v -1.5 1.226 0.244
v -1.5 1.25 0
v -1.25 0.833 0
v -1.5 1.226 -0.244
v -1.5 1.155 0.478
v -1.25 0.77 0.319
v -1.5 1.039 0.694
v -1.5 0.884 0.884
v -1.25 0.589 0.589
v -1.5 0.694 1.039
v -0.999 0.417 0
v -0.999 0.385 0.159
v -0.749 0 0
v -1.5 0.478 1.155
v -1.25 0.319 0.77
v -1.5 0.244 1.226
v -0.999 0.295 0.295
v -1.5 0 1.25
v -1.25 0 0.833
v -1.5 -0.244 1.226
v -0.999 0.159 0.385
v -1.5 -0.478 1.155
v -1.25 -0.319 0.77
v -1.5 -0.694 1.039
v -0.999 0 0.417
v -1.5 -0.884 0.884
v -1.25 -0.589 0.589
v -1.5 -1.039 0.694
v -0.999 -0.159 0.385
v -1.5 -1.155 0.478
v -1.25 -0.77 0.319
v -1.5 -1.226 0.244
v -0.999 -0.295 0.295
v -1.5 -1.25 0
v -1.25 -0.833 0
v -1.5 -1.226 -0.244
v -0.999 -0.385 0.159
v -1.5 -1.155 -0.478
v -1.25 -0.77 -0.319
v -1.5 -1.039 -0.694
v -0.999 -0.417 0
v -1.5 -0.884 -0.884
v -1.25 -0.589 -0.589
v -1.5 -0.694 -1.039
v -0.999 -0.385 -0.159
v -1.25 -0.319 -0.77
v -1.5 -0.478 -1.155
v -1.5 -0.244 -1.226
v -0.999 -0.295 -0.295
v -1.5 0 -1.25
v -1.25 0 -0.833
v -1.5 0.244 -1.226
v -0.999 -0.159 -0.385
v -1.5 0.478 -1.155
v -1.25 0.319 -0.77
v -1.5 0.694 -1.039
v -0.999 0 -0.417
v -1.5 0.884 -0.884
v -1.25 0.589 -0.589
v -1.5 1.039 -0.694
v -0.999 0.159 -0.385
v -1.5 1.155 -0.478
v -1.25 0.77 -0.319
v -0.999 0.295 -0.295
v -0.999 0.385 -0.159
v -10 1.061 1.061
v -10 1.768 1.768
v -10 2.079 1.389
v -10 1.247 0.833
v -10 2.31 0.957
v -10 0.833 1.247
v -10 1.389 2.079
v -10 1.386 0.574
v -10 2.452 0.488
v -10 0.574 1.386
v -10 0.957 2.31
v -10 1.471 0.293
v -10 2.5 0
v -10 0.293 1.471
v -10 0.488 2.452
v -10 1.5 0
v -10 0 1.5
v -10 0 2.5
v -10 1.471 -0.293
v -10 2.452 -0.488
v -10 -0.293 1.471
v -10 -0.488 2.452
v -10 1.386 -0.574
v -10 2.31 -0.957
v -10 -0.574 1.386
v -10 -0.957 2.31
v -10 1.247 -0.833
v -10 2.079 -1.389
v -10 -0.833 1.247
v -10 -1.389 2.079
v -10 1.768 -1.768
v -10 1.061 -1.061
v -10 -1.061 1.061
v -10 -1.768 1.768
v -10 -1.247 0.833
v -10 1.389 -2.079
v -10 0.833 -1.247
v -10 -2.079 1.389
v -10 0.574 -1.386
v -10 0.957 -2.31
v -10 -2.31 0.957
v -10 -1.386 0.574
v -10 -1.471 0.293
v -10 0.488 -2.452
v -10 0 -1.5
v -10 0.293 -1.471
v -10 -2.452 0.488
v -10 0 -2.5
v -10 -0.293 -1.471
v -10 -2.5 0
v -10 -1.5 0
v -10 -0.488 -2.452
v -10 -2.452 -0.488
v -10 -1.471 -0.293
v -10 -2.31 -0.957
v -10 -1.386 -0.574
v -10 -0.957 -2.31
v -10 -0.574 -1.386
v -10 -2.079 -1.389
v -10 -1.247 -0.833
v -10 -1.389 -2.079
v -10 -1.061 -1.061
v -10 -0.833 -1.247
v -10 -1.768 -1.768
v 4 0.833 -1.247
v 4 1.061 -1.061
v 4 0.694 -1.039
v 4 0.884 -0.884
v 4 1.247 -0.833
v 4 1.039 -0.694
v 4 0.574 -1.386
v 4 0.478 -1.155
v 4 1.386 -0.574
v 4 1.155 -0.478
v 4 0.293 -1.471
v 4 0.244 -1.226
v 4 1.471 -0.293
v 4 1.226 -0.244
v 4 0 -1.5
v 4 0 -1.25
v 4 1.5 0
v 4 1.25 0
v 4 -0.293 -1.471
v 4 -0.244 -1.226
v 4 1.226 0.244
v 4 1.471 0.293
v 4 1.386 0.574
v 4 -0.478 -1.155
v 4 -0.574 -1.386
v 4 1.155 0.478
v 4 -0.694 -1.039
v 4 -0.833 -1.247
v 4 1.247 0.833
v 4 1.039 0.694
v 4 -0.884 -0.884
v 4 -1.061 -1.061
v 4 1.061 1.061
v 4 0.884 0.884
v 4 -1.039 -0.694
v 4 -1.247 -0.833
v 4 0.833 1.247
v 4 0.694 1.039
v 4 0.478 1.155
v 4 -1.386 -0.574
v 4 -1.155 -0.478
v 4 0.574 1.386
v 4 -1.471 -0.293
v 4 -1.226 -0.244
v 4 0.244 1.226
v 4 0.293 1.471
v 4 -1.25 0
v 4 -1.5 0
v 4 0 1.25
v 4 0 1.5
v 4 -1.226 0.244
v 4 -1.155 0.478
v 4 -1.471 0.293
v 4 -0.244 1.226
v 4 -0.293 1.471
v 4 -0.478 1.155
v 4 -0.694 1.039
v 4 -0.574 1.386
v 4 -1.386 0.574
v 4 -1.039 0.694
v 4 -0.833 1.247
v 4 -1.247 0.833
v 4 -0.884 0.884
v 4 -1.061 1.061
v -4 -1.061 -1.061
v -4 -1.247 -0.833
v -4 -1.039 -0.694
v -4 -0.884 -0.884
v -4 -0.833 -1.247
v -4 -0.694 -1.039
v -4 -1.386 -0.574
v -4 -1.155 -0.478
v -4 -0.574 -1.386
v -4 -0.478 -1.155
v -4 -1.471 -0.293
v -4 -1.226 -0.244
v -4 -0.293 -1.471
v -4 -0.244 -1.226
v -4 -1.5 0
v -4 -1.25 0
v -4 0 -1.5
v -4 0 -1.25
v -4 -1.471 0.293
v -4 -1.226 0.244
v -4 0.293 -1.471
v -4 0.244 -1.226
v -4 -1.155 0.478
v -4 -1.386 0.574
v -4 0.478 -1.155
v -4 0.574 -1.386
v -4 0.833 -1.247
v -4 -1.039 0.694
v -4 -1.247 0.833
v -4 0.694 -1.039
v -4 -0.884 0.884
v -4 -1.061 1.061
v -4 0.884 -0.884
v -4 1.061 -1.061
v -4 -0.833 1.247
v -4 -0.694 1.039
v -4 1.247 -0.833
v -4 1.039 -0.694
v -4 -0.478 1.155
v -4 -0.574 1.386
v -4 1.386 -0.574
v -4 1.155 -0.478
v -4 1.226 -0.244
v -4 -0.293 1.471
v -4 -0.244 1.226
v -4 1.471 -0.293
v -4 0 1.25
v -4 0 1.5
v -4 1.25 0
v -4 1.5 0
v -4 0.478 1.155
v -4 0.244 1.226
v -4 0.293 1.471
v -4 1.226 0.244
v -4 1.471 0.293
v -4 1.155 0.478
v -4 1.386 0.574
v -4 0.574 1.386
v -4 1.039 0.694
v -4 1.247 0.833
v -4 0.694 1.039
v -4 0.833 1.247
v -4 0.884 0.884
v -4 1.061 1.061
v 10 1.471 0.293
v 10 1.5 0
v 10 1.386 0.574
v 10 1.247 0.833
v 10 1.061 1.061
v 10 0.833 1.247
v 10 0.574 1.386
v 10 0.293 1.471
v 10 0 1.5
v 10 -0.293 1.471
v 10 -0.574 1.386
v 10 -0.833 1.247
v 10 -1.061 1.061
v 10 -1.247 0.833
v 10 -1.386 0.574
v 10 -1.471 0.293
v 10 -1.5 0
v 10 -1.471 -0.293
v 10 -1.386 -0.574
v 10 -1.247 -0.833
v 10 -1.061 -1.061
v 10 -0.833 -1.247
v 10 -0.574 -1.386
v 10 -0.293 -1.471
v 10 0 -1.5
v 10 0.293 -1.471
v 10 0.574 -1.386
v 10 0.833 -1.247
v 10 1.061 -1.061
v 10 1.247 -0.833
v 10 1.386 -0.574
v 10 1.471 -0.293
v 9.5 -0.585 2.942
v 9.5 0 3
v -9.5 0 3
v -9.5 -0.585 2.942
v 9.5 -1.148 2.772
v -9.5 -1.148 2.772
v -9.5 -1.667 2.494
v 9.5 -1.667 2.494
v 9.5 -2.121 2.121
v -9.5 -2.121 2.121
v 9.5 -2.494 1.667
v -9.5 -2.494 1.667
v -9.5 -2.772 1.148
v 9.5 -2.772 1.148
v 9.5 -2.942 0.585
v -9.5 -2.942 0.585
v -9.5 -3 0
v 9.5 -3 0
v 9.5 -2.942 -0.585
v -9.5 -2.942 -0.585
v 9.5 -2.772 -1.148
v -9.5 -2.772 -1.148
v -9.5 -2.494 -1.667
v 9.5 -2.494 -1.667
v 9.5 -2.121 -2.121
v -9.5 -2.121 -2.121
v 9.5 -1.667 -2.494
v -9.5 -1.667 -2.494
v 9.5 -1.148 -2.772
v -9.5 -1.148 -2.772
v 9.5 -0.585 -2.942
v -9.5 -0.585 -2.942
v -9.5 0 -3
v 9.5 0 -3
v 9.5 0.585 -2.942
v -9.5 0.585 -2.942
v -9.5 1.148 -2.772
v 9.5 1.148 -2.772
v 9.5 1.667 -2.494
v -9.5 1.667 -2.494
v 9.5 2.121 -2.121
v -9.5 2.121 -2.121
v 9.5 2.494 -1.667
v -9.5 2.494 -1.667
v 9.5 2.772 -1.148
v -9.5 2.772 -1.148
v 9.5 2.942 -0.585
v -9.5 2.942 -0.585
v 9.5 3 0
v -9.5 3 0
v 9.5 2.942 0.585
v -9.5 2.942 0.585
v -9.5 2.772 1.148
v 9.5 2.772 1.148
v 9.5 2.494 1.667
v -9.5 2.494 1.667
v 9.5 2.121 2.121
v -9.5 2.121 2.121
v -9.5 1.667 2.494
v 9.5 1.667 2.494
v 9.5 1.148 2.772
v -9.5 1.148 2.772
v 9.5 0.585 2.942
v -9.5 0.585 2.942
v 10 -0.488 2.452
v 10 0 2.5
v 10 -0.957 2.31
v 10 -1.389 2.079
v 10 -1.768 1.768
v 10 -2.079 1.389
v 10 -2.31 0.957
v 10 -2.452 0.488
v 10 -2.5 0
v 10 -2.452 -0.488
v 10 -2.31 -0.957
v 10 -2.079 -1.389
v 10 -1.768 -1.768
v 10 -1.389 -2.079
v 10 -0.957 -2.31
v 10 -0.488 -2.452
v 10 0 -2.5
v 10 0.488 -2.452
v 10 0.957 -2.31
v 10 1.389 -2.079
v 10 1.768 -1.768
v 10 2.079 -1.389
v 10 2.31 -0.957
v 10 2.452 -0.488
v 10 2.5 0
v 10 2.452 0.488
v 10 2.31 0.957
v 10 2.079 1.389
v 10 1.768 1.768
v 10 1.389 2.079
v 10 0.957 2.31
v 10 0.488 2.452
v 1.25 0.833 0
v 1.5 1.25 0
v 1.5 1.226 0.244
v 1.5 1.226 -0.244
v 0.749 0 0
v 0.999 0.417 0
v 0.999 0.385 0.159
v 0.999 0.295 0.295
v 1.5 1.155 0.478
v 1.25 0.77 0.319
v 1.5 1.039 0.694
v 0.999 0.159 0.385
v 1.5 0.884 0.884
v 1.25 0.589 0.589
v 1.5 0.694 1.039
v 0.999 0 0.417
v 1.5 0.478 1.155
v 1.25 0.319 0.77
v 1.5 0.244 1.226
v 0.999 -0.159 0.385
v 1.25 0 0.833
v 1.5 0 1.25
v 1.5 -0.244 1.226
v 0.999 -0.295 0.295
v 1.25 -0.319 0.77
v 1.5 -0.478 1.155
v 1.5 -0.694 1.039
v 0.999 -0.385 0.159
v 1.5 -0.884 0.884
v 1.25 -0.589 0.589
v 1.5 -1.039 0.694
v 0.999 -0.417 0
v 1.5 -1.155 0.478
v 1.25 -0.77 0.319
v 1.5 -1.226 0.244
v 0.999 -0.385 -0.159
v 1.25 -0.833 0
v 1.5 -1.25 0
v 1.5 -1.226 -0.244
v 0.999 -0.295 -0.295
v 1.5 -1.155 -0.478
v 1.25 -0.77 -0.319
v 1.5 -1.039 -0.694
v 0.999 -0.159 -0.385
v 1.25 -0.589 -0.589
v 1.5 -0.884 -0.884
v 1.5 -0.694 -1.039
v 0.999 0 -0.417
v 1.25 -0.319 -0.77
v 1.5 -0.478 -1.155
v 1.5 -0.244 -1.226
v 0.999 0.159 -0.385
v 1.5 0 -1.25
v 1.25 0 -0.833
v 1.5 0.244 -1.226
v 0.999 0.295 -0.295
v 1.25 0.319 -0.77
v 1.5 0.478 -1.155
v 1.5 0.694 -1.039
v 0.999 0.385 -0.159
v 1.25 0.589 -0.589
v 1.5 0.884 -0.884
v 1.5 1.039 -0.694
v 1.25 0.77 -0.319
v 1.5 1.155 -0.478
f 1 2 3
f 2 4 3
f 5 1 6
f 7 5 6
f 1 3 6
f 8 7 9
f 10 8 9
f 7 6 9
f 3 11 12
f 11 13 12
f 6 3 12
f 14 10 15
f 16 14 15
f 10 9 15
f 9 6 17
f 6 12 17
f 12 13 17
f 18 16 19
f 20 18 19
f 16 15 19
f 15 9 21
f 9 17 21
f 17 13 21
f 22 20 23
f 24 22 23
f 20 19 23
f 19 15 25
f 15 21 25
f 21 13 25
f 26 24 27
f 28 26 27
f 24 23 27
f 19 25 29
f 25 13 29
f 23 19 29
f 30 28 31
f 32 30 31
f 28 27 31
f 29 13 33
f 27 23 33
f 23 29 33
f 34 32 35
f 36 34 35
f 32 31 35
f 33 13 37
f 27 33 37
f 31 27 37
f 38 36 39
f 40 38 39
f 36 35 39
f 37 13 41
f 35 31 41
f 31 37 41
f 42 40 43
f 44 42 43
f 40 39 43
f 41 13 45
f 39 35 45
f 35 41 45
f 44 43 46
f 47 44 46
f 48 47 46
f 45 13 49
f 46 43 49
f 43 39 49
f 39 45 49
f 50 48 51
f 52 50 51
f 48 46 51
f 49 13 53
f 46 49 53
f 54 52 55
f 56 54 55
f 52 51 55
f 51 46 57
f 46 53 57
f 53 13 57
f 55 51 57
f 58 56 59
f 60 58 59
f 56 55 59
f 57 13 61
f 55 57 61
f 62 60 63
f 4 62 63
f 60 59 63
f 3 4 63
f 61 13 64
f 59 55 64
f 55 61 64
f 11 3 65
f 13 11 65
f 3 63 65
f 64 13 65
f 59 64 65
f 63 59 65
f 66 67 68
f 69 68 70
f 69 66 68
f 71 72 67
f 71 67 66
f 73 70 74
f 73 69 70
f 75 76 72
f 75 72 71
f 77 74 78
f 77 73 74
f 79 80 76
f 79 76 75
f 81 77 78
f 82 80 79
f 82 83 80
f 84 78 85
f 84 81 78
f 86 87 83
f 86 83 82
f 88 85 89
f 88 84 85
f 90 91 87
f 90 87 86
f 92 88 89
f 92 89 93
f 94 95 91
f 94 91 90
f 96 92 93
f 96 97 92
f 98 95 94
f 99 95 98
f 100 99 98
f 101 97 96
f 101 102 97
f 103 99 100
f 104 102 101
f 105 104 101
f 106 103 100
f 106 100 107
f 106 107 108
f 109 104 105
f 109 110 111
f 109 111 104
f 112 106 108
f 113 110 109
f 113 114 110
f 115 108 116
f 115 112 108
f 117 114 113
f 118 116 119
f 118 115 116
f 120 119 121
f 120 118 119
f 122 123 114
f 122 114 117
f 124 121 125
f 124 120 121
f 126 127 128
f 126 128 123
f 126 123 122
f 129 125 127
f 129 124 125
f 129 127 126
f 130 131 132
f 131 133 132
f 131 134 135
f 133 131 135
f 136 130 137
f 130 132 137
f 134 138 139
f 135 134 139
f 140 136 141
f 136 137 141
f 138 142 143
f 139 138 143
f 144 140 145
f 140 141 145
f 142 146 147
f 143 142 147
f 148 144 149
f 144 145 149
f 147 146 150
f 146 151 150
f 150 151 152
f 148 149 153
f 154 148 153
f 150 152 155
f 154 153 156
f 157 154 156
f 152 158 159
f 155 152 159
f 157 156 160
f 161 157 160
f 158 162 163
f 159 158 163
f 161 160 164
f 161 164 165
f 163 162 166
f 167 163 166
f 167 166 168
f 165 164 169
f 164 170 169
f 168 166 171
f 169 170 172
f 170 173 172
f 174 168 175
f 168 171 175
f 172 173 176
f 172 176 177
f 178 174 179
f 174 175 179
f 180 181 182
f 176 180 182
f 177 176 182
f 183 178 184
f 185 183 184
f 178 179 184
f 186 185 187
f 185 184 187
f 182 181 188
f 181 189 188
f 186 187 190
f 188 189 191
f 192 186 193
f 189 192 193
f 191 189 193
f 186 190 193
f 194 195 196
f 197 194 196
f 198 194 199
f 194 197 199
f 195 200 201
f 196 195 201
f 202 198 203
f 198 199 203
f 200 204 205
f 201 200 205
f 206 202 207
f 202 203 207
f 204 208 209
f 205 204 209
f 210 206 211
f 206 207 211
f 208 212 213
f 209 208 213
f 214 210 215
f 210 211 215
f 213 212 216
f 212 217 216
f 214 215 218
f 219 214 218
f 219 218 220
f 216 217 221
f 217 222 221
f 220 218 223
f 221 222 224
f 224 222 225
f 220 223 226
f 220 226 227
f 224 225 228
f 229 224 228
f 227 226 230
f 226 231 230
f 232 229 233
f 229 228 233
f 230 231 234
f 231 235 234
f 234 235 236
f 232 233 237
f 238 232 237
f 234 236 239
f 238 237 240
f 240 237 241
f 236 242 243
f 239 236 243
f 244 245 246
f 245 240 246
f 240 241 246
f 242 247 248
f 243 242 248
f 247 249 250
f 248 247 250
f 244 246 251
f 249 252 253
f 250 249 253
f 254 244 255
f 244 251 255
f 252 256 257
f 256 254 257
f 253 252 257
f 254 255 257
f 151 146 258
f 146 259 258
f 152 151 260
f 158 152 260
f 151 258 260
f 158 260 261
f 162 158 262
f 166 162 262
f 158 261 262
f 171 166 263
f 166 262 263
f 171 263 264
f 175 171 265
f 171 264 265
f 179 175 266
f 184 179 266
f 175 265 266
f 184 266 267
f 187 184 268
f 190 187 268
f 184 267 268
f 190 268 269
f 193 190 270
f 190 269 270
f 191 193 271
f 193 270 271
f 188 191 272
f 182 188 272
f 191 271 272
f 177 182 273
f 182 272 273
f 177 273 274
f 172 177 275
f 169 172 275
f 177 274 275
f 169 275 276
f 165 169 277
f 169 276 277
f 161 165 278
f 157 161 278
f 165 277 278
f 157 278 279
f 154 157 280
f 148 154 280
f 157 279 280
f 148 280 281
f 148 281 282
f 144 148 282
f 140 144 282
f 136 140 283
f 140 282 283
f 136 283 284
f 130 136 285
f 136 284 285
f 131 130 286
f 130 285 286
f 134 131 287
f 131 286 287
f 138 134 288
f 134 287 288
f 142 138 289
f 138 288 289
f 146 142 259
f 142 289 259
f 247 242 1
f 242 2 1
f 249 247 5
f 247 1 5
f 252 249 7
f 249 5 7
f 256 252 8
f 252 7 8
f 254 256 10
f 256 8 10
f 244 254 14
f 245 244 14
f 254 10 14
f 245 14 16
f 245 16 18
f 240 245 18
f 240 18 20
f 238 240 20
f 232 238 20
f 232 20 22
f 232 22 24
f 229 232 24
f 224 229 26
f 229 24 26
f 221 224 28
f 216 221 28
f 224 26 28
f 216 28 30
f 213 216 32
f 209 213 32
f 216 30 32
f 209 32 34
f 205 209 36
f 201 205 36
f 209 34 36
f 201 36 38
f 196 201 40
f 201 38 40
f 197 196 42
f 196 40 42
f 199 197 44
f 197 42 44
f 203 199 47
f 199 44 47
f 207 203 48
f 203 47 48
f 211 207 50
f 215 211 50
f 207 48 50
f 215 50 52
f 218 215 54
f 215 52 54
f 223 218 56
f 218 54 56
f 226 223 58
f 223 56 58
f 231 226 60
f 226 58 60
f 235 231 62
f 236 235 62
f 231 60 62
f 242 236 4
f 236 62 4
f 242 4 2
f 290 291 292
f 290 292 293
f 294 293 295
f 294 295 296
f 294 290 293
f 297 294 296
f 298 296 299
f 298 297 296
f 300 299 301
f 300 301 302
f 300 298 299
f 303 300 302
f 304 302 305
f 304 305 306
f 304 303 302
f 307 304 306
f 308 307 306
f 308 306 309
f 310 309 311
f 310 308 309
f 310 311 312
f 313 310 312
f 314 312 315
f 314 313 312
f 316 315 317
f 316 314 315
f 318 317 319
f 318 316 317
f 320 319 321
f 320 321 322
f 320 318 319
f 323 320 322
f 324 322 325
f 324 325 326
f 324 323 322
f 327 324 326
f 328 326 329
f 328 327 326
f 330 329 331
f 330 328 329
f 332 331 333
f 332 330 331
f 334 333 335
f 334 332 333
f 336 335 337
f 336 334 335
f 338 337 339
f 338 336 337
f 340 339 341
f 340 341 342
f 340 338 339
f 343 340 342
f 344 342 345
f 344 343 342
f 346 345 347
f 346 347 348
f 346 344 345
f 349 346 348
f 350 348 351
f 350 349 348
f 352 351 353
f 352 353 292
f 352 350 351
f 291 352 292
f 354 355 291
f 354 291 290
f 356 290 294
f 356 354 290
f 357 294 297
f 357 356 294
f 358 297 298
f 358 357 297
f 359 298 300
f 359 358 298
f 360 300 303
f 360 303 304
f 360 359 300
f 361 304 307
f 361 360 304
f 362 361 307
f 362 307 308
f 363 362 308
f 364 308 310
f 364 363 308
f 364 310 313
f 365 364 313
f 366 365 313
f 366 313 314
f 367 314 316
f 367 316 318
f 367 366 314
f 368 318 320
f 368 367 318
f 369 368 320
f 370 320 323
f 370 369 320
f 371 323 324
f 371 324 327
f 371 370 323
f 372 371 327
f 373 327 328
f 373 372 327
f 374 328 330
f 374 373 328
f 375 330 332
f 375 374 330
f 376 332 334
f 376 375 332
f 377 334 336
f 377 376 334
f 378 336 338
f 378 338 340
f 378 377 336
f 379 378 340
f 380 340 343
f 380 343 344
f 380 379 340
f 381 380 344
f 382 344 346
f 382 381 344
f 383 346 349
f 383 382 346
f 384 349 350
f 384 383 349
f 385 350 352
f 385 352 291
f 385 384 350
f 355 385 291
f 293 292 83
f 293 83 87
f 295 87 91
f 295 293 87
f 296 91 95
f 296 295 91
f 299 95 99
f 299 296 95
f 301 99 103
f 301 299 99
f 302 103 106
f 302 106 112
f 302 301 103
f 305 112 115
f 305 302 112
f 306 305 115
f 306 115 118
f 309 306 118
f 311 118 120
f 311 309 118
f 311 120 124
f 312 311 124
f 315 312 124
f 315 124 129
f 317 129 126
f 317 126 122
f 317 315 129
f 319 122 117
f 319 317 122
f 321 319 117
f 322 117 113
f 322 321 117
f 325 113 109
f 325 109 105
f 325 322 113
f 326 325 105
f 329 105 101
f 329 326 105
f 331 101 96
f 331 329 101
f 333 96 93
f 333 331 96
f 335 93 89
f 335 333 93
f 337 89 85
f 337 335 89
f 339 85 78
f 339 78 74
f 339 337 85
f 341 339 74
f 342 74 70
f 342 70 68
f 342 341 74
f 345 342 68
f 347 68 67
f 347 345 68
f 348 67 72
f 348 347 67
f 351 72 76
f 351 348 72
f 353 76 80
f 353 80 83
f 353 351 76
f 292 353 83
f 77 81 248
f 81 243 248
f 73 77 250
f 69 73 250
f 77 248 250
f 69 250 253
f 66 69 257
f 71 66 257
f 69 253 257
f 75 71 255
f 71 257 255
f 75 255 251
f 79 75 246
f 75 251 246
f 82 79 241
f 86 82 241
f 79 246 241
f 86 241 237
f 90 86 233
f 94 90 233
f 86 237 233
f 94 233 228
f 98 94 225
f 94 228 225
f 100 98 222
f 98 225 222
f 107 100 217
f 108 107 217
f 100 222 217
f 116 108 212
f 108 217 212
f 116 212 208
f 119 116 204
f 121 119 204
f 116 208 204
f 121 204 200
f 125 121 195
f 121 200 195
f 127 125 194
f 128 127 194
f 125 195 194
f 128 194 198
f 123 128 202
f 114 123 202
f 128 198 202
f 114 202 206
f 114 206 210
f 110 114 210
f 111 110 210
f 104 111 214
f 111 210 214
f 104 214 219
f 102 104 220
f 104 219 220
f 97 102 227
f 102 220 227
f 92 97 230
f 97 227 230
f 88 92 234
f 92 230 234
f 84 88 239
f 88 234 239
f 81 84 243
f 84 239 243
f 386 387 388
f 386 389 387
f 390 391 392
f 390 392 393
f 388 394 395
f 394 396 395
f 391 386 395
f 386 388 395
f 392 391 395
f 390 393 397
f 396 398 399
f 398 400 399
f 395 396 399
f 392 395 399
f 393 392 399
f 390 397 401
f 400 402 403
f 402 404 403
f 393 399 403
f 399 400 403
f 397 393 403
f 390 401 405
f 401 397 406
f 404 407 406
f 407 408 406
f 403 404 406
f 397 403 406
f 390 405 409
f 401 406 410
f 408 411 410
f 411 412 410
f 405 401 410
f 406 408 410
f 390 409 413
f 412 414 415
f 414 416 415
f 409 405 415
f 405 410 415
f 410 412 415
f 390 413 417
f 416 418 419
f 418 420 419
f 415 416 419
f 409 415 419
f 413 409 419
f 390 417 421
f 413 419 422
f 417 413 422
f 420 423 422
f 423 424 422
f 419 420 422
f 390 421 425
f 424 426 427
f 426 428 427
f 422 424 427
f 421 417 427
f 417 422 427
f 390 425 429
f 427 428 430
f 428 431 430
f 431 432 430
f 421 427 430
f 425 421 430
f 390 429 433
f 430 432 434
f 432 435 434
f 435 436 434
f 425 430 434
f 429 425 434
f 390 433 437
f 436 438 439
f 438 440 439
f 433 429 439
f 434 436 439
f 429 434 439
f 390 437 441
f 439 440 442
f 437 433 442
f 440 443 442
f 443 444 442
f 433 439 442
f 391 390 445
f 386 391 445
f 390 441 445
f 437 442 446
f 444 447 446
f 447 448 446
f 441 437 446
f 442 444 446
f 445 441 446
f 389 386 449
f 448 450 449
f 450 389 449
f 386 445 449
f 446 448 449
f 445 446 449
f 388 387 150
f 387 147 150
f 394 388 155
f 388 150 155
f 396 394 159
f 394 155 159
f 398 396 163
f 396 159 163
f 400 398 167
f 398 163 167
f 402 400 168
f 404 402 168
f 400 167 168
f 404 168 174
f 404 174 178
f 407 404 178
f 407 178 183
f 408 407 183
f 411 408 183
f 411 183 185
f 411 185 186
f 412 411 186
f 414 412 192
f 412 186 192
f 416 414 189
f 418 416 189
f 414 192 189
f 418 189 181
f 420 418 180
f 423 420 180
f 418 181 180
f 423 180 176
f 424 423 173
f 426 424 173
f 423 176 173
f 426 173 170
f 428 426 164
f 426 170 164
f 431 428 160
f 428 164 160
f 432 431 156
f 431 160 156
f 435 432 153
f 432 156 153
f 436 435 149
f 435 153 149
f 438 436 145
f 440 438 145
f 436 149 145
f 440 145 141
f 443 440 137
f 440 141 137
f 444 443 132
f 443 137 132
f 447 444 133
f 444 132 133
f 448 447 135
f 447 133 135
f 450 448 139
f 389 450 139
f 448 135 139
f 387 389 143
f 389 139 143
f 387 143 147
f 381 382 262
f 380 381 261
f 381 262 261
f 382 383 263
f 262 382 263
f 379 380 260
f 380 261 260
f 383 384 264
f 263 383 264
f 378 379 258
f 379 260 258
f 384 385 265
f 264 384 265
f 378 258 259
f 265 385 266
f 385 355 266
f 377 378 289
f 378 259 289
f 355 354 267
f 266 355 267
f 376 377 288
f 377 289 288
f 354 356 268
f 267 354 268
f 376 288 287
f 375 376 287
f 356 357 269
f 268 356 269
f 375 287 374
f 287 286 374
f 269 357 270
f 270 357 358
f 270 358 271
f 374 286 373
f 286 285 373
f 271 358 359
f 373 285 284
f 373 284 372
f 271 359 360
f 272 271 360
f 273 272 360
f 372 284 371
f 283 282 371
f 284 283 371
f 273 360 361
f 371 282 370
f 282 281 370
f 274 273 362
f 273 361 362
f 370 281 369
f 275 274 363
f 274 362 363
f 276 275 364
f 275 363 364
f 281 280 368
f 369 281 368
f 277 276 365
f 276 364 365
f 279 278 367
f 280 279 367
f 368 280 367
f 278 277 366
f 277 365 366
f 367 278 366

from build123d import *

# Parameters (mm, degrees)
SKETCH_1_W     = 20
SKETCH_1_H     = 3
CHAMFER_1_SIZE = 0.5


# Read off the part's stored shape, not the designer's step: M3x0.5 ねじ穴2
with BuildPart() as part:
    # ｽｹｯﾁ1 → 回転1 (revolve)
    with BuildSketch(Plane.XY, mode=Mode.PRIVATE) as revolve_1_sk:
        with Locations((0, 1.5)):
            Rectangle(SKETCH_1_W, SKETCH_1_H)
    revolve(revolve_1_sk.sketch.rotate(Axis((0, 0, 0), (1, 0, 0)), 90), axis=Axis((0, 0, 0), (1, 0, 0)))

    # M3x0.5 ねじ穴2 outline → M3x0.5 ねじ穴2 (revolve, cut)
    with BuildSketch(Plane.YX):
        Polygon((0, 10), (0, 0.748924226), (1.25, 1.5), (1.25, 4), (1.5, 4), (1.5, 10), align=None)
        Polygon((1.25, -1.5), (0, -0.748924226), (0, -10), (1.5, -10), (1.5, -4), (1.25, -4), align=None)
    revolve(axis=Axis((0, 0, 0), (1, 0, 0)), mode=Mode.SUBTRACT)

    # 面取り1
    chamfer_1_edges = [part.edges().sort_by_distance(p)[0] for p in [
        (-10, 0, -3),
        (10, 0, -3),
    ]]
    chamfer(chamfer_1_edges, length=CHAMFER_1_SIZE)


solid = part.part
